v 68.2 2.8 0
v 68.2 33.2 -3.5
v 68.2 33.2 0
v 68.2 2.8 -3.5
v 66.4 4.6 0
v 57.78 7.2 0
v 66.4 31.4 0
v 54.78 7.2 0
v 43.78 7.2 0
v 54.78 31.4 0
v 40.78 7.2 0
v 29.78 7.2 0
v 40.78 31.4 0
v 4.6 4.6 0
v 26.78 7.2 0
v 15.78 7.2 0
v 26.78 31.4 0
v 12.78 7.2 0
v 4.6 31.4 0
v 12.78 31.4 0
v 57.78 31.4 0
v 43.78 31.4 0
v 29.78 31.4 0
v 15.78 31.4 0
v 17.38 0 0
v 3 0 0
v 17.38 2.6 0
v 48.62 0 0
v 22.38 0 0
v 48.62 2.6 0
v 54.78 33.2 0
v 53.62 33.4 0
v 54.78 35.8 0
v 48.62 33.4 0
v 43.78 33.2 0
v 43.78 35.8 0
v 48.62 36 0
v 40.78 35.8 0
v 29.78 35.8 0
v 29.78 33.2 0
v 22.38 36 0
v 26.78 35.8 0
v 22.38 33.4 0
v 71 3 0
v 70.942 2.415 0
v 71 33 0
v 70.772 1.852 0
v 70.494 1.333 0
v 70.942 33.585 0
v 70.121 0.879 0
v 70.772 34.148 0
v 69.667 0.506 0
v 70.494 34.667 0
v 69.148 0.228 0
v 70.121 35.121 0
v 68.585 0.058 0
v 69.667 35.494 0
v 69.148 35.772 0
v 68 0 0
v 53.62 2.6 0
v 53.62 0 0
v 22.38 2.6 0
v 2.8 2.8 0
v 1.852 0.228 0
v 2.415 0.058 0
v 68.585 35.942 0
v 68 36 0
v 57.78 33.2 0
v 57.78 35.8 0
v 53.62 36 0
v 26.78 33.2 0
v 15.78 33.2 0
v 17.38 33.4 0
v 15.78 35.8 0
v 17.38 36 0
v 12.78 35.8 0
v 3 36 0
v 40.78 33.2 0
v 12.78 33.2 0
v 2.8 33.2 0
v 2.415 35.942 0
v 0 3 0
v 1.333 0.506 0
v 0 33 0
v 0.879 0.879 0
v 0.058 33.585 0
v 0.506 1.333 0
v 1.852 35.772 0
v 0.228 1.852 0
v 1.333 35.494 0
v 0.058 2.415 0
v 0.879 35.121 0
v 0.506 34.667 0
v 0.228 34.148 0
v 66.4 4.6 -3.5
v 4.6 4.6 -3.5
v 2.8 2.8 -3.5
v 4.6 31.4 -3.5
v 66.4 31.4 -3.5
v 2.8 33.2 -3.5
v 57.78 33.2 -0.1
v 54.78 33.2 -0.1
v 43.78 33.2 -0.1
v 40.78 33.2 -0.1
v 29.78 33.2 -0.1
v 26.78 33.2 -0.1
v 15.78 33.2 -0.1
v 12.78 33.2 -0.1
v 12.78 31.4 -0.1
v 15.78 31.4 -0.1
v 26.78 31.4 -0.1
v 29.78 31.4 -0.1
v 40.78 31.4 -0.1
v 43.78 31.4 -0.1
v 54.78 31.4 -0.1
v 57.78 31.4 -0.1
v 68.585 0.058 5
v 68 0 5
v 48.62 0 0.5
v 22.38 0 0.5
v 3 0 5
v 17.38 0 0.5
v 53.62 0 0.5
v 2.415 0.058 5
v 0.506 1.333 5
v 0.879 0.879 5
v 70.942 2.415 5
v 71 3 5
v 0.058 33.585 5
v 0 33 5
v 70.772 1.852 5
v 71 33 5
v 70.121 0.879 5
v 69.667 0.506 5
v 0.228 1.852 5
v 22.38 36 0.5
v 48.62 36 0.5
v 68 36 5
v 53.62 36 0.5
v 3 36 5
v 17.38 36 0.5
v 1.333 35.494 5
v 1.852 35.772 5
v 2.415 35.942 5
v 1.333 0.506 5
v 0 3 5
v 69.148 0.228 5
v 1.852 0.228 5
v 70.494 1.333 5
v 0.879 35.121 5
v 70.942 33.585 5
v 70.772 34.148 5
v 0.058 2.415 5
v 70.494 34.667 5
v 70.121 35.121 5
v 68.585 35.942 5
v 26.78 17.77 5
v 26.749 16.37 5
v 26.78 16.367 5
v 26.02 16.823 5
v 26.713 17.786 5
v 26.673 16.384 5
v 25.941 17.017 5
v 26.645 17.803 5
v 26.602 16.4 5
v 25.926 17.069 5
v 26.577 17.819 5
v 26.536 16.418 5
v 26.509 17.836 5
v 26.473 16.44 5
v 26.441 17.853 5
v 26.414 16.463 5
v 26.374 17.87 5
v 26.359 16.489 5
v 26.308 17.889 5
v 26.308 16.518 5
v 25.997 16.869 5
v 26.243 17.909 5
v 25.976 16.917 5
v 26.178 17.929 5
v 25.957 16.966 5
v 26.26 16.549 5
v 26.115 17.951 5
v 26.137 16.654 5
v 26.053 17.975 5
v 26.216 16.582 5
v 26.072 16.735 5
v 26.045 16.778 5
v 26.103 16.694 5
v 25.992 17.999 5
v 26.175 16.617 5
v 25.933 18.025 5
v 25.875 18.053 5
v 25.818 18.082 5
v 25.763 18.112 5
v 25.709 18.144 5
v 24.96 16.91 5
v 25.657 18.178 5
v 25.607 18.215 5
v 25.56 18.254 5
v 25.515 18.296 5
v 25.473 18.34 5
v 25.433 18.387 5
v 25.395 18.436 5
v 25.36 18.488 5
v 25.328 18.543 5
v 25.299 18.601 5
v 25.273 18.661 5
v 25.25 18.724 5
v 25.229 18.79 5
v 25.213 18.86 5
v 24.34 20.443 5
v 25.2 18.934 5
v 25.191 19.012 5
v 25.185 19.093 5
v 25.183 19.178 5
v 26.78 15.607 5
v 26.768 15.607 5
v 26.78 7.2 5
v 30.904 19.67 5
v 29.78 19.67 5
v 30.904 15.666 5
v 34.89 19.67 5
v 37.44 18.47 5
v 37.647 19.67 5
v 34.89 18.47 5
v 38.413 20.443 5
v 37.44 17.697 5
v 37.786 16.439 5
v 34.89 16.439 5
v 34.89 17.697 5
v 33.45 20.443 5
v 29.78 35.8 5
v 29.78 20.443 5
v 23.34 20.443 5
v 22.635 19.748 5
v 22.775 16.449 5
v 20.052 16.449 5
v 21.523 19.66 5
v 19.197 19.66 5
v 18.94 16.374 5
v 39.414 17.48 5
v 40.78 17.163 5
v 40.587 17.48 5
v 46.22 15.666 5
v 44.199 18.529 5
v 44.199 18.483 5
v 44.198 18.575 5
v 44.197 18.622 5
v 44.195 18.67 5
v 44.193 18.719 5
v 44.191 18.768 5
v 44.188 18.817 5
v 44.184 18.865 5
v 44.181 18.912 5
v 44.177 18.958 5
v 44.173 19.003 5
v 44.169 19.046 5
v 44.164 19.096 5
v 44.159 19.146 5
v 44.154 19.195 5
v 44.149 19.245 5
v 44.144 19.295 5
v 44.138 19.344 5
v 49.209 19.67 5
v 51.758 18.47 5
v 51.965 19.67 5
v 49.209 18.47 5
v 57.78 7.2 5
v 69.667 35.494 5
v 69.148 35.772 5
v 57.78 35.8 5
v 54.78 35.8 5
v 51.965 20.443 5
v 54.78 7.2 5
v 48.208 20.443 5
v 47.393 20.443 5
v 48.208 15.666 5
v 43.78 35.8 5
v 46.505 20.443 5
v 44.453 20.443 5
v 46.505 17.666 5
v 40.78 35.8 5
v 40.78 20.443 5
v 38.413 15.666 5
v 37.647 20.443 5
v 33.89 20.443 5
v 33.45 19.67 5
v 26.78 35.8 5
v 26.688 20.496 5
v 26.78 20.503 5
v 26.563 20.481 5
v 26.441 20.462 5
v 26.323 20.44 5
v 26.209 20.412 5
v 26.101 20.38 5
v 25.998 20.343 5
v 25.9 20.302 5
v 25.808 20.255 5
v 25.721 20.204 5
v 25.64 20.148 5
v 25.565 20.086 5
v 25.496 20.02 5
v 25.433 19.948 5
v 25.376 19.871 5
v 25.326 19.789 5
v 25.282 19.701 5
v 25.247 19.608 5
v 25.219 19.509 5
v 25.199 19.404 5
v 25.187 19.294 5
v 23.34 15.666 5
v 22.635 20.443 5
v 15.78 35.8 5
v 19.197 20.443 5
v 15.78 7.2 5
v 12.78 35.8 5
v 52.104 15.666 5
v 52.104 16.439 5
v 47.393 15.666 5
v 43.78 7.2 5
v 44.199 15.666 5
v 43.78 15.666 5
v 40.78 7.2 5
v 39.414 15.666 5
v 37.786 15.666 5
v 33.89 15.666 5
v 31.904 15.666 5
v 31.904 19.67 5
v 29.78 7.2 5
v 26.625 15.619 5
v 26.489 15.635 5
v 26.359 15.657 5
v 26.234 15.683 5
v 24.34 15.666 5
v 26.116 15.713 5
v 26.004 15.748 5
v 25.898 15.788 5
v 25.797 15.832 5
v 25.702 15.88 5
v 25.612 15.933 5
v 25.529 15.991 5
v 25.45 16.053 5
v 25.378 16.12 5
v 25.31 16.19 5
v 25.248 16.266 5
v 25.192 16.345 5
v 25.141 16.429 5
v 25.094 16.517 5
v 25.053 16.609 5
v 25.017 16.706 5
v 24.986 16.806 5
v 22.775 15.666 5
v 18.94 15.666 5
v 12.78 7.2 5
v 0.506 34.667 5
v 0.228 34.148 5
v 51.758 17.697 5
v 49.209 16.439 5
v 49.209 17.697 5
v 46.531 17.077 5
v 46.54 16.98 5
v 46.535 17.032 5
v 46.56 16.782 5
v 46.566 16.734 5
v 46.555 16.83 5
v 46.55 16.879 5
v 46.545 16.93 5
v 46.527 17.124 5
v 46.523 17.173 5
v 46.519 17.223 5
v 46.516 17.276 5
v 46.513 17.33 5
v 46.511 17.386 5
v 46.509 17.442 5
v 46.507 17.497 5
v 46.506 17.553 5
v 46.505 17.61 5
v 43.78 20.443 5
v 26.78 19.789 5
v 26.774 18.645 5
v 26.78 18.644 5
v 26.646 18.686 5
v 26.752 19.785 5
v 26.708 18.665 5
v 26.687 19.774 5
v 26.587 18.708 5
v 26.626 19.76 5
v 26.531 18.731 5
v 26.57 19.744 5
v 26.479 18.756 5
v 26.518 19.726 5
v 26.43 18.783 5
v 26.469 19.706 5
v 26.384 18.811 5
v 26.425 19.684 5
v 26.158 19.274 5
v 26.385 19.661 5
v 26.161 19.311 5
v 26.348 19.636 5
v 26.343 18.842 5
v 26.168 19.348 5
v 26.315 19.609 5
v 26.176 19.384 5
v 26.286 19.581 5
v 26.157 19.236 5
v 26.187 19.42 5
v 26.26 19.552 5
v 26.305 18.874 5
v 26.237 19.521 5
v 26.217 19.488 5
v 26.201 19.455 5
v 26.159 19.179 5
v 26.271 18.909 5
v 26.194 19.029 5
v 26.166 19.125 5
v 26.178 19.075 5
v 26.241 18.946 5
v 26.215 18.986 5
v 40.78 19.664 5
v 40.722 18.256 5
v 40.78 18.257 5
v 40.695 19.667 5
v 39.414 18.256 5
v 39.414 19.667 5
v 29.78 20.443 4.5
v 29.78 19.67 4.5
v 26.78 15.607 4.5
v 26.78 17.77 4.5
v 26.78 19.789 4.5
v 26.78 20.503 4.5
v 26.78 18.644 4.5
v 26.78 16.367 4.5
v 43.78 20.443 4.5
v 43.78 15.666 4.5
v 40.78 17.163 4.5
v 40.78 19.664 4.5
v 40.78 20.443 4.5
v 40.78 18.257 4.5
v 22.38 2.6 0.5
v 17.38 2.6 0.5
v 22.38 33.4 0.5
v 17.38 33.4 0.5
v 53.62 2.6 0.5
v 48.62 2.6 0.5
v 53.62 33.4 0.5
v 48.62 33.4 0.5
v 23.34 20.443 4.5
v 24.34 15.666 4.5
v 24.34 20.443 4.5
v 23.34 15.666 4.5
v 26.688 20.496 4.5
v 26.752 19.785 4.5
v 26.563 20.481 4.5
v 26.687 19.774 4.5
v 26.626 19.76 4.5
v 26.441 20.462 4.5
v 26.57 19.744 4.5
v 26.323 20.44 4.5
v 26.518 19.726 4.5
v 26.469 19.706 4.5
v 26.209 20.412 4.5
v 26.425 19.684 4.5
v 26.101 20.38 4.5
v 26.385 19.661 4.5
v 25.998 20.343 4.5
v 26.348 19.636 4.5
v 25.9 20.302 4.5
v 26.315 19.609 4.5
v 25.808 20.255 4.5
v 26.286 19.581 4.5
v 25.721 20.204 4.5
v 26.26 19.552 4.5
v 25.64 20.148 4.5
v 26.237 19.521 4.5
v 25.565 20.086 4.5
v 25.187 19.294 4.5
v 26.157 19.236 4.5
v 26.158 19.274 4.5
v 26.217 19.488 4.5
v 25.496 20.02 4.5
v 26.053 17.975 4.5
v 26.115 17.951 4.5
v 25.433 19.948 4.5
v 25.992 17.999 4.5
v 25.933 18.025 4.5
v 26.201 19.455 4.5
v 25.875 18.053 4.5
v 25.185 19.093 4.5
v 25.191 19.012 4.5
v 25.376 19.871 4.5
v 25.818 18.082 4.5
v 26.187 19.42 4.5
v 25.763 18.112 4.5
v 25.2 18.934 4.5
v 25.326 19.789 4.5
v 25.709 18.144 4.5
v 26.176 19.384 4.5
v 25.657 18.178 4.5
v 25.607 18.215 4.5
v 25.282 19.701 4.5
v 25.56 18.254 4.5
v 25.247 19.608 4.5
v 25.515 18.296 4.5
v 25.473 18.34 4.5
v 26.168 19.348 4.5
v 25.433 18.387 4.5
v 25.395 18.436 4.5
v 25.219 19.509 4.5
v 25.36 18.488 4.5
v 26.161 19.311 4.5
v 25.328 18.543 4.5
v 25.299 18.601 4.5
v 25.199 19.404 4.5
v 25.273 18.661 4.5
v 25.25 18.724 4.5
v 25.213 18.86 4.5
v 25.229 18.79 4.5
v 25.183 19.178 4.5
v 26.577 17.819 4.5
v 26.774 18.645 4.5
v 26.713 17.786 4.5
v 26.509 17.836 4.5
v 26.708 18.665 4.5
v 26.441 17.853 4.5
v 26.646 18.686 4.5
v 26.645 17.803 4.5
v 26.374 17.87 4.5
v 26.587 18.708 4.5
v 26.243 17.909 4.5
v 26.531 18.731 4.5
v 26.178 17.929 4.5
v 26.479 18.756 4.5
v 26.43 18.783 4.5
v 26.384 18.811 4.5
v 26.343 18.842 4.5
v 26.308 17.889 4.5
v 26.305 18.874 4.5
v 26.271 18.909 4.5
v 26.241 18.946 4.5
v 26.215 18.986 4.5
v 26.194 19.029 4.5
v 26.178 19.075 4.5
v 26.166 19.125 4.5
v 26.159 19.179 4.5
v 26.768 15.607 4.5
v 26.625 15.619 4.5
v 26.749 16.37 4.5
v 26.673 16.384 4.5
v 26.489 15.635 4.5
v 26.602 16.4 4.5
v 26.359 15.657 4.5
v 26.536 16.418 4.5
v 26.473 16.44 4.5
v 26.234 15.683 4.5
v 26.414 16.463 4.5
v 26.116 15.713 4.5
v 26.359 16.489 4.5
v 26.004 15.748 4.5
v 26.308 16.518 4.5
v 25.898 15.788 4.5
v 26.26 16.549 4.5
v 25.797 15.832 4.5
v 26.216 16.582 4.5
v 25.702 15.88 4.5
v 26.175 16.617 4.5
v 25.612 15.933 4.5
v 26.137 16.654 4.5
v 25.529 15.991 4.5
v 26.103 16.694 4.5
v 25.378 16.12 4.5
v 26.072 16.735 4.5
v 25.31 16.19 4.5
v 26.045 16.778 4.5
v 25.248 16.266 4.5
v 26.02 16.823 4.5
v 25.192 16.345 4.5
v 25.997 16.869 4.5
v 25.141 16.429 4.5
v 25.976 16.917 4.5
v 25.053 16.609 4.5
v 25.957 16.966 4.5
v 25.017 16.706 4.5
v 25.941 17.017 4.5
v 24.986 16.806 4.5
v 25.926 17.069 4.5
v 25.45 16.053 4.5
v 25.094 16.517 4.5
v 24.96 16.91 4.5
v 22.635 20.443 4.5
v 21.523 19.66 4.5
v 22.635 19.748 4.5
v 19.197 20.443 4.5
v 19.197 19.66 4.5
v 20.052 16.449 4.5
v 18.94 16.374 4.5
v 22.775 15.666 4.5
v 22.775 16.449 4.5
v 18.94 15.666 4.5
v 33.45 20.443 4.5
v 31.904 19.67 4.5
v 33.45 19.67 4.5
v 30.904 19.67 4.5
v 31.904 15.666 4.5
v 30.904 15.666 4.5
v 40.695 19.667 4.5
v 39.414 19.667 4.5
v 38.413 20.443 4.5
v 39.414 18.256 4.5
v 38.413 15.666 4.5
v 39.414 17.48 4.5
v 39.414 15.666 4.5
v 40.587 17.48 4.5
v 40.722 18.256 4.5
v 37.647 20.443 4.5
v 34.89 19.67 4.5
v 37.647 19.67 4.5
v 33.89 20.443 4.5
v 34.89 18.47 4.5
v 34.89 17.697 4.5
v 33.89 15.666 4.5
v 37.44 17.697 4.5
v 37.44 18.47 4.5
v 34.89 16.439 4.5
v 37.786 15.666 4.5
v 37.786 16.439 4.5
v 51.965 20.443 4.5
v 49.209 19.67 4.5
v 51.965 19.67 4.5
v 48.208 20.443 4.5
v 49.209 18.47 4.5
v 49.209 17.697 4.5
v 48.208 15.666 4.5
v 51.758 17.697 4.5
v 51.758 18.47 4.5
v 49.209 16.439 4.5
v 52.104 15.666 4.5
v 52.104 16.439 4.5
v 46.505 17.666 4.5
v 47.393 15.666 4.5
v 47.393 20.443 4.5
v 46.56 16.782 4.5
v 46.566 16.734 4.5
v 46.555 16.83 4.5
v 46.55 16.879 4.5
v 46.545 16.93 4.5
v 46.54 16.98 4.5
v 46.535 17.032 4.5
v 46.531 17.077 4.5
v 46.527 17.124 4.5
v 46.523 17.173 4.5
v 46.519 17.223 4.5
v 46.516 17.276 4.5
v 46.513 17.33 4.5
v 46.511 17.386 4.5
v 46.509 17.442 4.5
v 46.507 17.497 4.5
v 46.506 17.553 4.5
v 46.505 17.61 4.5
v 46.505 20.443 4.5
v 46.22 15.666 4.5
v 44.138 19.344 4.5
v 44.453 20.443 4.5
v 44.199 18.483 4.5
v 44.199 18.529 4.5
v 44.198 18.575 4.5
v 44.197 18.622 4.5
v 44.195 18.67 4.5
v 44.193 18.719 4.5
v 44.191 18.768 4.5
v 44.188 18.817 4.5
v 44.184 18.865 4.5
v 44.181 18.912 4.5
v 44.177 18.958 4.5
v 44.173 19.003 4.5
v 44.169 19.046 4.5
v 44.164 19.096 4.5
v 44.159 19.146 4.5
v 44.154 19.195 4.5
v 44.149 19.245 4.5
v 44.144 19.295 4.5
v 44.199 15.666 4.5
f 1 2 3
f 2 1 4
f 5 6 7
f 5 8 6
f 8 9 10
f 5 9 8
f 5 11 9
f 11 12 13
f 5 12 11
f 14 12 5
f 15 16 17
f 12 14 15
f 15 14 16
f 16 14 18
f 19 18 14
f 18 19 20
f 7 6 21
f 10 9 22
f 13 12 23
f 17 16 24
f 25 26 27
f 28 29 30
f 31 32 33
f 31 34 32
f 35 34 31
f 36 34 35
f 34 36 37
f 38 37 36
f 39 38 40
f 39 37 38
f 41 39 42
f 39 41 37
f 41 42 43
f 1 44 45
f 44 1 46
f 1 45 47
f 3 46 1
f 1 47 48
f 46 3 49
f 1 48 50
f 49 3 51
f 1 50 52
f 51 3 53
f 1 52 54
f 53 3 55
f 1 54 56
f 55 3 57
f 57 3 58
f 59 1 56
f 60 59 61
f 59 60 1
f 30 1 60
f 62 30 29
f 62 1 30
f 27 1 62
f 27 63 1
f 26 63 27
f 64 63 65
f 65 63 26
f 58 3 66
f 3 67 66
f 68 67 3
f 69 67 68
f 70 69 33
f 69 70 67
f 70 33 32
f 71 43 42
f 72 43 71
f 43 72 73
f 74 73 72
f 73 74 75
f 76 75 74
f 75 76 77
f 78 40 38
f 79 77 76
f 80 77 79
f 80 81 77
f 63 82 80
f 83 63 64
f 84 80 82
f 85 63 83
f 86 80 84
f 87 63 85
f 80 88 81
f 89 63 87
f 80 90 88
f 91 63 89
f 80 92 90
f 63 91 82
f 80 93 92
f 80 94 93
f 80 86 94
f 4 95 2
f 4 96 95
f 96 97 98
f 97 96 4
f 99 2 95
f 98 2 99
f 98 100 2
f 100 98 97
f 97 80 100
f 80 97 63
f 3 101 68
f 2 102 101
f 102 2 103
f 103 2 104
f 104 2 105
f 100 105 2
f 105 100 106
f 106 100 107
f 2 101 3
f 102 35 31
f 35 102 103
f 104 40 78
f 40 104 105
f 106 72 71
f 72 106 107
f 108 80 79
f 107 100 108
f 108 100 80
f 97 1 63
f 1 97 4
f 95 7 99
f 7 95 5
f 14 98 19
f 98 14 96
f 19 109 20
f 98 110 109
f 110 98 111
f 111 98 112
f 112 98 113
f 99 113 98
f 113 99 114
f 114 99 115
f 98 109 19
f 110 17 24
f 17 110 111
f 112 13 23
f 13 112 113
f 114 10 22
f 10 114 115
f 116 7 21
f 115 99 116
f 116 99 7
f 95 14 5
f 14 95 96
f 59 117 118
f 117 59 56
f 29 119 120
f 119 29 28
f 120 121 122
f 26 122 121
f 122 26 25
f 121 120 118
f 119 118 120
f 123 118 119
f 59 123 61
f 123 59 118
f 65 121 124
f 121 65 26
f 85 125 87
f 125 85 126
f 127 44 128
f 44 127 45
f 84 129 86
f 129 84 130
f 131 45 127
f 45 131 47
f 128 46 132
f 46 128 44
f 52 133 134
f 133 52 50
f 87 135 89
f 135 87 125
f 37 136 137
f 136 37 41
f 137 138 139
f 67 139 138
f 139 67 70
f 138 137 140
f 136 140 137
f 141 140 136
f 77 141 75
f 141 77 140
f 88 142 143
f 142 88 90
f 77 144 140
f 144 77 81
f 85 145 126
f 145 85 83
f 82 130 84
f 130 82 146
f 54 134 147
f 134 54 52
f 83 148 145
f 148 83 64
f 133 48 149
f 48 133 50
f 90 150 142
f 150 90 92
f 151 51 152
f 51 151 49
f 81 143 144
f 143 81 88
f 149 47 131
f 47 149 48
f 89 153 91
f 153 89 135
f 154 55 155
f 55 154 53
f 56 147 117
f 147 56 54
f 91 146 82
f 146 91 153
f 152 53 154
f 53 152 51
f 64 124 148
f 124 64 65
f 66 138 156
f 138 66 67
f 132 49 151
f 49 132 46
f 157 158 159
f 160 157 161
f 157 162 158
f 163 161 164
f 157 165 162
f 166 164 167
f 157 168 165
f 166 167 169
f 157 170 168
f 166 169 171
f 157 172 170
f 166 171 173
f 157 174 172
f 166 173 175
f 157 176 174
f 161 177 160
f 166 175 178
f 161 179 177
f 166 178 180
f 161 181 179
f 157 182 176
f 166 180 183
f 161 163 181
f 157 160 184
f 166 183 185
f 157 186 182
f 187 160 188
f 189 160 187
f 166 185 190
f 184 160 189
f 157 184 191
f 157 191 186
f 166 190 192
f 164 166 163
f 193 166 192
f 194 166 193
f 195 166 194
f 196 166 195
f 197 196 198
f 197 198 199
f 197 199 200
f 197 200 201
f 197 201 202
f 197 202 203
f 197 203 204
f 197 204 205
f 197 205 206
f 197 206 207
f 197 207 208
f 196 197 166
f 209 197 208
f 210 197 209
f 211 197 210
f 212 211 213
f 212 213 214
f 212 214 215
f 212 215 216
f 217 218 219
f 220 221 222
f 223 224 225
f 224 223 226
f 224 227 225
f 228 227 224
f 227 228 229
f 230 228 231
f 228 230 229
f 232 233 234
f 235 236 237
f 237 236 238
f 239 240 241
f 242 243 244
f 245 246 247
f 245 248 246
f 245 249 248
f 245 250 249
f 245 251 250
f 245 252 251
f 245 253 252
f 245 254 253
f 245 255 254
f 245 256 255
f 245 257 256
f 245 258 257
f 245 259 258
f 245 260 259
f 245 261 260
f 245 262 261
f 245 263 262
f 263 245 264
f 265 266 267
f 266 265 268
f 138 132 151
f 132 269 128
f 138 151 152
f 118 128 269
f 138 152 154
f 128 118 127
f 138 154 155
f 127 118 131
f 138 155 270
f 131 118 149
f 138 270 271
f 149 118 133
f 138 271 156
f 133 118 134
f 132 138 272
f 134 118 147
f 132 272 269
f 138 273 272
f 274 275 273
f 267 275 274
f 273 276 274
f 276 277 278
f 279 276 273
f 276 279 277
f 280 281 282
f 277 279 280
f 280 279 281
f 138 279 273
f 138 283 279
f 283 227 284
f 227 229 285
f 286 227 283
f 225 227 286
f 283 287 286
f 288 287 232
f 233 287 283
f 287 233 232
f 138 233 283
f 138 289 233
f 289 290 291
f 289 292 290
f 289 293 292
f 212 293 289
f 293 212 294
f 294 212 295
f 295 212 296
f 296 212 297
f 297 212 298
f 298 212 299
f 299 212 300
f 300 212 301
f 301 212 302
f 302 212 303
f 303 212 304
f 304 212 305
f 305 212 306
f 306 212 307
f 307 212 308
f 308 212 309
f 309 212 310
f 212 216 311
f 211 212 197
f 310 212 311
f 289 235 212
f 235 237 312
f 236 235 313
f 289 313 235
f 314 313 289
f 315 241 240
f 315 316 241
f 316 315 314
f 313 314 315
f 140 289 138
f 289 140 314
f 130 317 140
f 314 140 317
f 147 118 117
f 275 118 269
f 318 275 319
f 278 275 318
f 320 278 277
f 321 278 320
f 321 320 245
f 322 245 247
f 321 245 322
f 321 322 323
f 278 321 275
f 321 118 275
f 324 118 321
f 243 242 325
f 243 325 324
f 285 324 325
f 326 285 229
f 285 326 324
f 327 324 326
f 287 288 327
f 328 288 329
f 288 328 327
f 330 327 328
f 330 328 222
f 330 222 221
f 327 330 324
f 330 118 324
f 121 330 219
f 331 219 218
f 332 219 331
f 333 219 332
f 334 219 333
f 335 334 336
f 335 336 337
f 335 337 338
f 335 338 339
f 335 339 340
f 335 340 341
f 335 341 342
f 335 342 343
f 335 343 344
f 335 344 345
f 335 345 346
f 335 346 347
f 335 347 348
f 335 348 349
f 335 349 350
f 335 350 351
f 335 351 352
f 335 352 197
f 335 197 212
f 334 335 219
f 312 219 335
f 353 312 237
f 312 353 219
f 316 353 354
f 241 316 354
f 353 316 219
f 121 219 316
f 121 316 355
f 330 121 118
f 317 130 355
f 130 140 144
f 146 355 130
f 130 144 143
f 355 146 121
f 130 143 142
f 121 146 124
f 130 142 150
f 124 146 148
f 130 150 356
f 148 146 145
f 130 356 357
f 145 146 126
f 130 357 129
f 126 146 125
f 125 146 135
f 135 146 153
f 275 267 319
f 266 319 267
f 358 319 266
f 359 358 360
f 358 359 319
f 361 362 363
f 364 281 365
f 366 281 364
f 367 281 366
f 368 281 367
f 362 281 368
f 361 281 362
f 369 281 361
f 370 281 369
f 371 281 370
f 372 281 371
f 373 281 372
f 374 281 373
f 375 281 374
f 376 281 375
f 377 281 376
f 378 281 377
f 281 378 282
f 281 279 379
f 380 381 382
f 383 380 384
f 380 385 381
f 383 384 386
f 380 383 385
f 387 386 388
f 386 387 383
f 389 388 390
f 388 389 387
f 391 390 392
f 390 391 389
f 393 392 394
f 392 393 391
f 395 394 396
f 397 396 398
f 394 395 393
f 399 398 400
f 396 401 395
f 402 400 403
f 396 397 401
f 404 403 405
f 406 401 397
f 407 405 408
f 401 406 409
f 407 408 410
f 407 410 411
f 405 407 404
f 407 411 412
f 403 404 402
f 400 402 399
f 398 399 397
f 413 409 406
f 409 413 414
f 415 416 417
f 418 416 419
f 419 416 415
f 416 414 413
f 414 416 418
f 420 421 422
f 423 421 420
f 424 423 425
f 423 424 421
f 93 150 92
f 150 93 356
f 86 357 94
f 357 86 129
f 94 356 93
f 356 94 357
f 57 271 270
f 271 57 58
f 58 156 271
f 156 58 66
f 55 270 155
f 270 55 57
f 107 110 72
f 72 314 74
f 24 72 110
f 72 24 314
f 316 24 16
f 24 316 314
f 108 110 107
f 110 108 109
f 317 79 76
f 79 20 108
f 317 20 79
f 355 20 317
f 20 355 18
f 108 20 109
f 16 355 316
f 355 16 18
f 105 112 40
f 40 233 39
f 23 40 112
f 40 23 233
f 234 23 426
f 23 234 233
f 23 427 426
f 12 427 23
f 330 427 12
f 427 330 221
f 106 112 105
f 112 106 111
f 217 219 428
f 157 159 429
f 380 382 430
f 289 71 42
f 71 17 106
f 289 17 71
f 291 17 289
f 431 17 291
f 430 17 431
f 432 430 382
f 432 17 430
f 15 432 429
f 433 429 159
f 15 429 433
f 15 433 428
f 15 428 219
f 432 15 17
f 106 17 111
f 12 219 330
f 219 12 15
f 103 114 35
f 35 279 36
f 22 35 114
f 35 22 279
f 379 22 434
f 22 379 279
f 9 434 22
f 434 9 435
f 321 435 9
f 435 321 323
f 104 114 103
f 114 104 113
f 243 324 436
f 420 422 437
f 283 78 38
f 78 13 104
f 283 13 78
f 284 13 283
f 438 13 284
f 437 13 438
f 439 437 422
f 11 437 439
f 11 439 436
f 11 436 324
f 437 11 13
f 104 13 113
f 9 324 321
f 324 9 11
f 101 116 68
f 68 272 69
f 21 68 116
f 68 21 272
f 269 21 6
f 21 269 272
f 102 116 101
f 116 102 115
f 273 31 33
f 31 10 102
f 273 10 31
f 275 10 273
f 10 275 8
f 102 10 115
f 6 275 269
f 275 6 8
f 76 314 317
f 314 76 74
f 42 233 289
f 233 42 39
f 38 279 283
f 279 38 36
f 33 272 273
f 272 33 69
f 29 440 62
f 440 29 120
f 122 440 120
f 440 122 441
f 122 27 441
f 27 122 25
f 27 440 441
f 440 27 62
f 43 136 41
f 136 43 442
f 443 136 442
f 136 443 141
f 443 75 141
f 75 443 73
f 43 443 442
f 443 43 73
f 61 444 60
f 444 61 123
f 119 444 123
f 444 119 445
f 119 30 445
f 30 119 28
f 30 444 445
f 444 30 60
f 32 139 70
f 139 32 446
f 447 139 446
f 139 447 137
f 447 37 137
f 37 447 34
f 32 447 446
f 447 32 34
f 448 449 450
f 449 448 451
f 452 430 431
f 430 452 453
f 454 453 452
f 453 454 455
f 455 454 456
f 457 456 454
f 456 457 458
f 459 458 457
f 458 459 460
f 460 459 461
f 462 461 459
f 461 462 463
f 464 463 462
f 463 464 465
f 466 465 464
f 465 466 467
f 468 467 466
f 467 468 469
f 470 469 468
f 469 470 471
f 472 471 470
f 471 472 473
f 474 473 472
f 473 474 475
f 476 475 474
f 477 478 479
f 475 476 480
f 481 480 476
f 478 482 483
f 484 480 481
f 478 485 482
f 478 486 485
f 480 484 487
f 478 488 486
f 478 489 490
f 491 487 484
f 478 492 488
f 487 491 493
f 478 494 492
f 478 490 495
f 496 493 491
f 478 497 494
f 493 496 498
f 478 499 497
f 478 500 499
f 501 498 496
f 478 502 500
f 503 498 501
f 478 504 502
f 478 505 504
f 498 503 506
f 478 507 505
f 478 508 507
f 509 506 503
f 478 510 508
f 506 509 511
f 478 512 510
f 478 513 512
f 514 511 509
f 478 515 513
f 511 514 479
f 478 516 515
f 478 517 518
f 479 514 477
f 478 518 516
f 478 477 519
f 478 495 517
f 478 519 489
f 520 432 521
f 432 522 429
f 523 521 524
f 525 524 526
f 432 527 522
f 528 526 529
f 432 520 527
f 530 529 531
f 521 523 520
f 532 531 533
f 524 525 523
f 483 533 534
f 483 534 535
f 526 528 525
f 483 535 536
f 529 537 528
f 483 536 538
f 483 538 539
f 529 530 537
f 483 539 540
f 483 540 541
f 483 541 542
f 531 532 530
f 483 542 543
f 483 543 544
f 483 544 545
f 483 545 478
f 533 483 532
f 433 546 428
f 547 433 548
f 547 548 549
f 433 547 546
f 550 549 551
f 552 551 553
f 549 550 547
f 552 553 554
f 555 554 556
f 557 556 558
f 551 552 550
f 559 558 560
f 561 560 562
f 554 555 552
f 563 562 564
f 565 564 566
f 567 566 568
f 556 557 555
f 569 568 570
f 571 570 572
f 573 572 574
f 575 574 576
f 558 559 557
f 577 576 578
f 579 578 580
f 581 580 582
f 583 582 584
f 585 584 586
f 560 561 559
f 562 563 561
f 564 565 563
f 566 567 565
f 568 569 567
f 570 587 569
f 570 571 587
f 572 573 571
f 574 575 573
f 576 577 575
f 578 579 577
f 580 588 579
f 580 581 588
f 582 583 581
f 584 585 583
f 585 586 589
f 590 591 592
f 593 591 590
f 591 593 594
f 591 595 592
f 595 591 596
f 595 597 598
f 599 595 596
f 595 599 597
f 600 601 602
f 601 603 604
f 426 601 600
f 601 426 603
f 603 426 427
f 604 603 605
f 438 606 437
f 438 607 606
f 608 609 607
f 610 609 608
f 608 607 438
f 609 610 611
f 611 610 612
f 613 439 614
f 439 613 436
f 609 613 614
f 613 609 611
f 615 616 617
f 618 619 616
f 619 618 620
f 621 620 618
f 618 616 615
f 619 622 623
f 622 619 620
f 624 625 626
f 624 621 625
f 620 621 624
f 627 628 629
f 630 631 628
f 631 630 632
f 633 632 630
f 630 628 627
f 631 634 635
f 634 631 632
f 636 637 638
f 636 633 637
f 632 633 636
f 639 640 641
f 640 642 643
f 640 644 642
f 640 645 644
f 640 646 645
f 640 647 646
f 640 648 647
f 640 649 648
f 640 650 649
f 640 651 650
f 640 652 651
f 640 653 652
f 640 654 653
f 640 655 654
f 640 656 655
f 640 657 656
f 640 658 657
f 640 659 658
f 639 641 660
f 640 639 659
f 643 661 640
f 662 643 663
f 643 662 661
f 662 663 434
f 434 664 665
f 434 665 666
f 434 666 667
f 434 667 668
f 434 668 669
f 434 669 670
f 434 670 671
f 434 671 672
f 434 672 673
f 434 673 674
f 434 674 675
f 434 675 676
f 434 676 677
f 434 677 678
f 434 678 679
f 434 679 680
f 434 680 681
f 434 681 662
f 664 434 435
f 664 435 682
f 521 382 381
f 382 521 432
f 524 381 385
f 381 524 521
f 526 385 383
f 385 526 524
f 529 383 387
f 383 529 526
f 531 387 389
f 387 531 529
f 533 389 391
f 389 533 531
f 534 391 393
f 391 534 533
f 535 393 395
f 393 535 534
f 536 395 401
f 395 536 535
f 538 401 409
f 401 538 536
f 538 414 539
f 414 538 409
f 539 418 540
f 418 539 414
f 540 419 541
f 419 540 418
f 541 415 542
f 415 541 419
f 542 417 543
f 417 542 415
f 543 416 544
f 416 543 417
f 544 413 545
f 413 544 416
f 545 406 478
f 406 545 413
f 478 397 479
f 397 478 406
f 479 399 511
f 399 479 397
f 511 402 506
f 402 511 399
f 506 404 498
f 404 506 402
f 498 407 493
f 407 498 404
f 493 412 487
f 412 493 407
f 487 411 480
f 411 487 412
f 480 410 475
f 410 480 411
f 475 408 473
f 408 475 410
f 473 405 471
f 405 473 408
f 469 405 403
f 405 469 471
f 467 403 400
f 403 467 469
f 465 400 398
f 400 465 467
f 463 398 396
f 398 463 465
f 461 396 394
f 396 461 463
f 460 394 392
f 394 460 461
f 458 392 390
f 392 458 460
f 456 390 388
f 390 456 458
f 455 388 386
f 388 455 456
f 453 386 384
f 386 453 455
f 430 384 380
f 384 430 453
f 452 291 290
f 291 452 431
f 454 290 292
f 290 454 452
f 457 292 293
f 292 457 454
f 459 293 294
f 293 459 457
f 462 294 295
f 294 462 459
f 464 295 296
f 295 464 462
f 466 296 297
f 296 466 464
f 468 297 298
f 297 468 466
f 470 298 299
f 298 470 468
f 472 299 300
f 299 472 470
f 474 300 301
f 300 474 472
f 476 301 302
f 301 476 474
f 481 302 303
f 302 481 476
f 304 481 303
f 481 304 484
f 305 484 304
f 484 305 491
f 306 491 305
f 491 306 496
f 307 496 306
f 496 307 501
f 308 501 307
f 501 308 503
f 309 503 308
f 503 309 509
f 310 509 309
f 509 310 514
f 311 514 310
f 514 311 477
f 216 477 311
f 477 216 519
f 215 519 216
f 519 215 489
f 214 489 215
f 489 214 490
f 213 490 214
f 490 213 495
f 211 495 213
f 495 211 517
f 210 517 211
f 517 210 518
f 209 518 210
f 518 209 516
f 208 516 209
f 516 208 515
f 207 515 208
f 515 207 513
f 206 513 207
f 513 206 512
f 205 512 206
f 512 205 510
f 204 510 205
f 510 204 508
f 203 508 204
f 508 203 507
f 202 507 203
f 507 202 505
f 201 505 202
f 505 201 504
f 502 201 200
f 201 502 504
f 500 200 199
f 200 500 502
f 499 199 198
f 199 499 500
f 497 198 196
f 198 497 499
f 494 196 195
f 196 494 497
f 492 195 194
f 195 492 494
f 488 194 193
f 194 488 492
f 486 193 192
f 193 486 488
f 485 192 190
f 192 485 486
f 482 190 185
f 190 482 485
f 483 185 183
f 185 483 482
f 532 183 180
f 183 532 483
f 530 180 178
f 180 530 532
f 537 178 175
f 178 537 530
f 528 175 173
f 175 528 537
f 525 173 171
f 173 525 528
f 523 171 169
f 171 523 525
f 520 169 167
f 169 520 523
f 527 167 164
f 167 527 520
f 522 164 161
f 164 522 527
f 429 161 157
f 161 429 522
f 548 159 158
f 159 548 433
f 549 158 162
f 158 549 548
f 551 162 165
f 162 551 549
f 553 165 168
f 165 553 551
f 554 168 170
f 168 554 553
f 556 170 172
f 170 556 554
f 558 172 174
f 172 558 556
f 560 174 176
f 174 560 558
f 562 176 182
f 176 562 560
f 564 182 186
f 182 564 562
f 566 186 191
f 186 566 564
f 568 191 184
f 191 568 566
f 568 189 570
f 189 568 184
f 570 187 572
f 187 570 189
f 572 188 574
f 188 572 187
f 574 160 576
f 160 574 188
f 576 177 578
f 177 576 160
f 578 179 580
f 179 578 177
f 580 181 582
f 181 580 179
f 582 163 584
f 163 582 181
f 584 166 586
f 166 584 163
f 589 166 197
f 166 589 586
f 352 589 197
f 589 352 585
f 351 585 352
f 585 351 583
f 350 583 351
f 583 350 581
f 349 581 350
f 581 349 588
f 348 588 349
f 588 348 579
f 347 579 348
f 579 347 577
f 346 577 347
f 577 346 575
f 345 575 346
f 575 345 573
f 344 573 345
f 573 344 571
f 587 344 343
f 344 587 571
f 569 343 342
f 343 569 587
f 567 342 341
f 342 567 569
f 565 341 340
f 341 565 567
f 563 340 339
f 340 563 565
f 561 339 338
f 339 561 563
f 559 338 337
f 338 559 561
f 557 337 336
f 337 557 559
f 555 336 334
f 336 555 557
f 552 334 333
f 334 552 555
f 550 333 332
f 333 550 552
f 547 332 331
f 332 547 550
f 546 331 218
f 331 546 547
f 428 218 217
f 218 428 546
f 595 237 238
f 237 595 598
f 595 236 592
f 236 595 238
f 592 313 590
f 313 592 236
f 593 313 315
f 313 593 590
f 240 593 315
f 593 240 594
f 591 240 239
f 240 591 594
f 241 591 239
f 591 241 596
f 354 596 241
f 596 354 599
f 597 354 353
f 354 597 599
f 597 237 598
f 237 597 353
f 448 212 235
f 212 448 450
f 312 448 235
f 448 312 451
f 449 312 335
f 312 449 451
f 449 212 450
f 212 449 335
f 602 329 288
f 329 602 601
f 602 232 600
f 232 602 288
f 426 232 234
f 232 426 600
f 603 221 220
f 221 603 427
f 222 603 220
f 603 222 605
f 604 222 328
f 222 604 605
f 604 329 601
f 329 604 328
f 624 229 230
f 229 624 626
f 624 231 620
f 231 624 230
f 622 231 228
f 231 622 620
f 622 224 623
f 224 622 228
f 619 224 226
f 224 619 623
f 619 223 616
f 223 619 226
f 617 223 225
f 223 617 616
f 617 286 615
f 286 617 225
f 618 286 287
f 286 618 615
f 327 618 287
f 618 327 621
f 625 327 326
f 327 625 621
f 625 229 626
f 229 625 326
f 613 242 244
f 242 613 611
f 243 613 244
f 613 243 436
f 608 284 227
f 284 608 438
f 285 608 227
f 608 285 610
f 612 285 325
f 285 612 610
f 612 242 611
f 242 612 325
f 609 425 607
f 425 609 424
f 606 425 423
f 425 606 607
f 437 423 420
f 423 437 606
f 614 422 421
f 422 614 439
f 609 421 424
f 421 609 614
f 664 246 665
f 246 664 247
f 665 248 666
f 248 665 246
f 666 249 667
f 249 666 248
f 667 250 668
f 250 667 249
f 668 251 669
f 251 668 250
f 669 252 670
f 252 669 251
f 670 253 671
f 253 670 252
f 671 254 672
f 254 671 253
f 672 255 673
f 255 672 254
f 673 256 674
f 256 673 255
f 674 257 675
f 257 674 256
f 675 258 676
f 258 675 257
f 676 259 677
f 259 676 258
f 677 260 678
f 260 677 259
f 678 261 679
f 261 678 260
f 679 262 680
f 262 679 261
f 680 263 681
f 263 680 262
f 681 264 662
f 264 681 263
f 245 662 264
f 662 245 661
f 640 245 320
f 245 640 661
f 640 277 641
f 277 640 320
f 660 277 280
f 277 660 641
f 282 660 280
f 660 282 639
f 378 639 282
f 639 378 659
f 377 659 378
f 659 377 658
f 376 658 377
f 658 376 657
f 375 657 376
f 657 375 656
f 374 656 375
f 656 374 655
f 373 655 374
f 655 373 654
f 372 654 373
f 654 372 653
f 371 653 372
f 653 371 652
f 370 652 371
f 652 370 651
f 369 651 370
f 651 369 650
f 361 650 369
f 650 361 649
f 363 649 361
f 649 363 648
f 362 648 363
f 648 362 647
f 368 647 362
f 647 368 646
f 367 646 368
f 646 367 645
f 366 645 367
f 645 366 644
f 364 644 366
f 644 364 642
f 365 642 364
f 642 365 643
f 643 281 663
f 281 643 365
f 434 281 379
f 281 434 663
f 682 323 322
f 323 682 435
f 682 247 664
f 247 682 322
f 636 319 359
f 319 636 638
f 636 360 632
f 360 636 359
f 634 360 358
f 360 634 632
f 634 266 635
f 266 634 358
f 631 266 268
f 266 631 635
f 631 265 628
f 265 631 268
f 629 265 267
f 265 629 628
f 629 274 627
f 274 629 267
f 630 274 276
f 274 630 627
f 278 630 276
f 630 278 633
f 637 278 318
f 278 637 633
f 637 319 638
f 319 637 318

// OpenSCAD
// ╔══════════════════════════════════════════════════════════╗
// ║  Pi Zero 2 WH Gehäuse – DECKEL                          ║
// ║  Tobias Meier · admin@secutobs.com · v0.2.0             ║
// ╠══════════════════════════════════════════════════════════╣
// ║  DRUCKEN:                                               ║
// ║  1. F6 → rendern  2. File → Export → STL               ║
// ║  Material:  PLA  |  Schichthöhe: 0.2mm                 ║
// ║  Wandlinien: 4   |  Infill: 20%  |  Support: NEIN      ║
// ║  Ausrichtung: Deckelaußenseite nach UNTEN               ║
// ╚══════════════════════════════════════════════════════════╝

// ── Gleiche Maße wie Unterteil ───────────────────────────
PI_L   = 65.0;
PI_B   = 30.0;
SPIEL  =  0.5;
WAND   =  2.5;
BODEN  =  1.8;
H_INNEN = 14.0;
R_ECKE =  3.0;

IN_L = PI_L + SPIEL*2;
IN_B = PI_B + SPIEL*2;
AU_L = IN_L + WAND*2;
AU_B = IN_B + WAND*2;
AU_H = H_INNEN + BODEN;

// ── Deckel-spezifisch ────────────────────────────────────
DH       =  5.0;    // Deckelhöhe gesamt
RAND_T   =  3.5;    // Tiefe Innenrand (greift ins Unterteil)
RAND_W   =  1.8;    // Wandstärke Innenrand
RAND_SP  =  0.3;    // Spiel Innenrand (damit er reinpasst)

$fn = 40;

// ════════════════════════════════════════════════════════
//  DECKEL
// ════════════════════════════════════════════════════════
module gehaeuse_deckel() {
    difference() {
        union() {
            // ── Deckplatte ───────────────────────────────
            hull() {
                for(x = [R_ECKE, AU_L - R_ECKE])
                for(y = [R_ECKE, AU_B - R_ECKE])
                    translate([x, y, 0])
                        cylinder(r=R_ECKE, h=DH, $fn=32);
            }

            // ── Innenrand (greift in Unterteil) ──────────
            translate([WAND + RAND_SP, WAND + RAND_SP, -RAND_T])
            difference() {
                cube([IN_L - RAND_SP*2, IN_B - RAND_SP*2, RAND_T]);
                translate([RAND_W, RAND_W, -0.1])
                    cube([IN_L - RAND_SP*2 - RAND_W*2,
                          IN_B - RAND_SP*2 - RAND_W*2,
                          RAND_T + 0.2]);
            }
        }

        // ── Lüftungsschlitze (schmal = kein Durchhängen) ─
        // 3 Reihen × 4 Schlitze
        for(row = [0:2])
        for(col = [0:3])
            translate([AU_L*0.18 + col*14, AU_B*0.2 + row*8, -0.1])
                cube([3.0, AU_B*0.35, DH + 0.2]);

        // ── Clip-Aussparungen (passend zu Unterteil) ────
        for(x = [AU_L*0.28, AU_L*0.72]) {
            translate([x - 2.5, -0.1, -RAND_T])
                cube([5, WAND + 0.2, RAND_T + 0.5]);
            translate([x - 2.5, AU_B - WAND - 0.1, -RAND_T])
                cube([5, WAND + 0.2, RAND_T + 0.5]);
        }

        // ── Beschriftung (vertieft) ──────────────────────
        // "ZISTERNE" in der Mitte des Deckels
        translate([AU_L/2, AU_B/2, DH - 0.5])
        linear_extrude(height=0.6)
        text("ZISTERNE", size=5, font="Liberation Sans:style=Bold",
             halign="center", valign="center");
    }
}

gehaeuse_deckel();
